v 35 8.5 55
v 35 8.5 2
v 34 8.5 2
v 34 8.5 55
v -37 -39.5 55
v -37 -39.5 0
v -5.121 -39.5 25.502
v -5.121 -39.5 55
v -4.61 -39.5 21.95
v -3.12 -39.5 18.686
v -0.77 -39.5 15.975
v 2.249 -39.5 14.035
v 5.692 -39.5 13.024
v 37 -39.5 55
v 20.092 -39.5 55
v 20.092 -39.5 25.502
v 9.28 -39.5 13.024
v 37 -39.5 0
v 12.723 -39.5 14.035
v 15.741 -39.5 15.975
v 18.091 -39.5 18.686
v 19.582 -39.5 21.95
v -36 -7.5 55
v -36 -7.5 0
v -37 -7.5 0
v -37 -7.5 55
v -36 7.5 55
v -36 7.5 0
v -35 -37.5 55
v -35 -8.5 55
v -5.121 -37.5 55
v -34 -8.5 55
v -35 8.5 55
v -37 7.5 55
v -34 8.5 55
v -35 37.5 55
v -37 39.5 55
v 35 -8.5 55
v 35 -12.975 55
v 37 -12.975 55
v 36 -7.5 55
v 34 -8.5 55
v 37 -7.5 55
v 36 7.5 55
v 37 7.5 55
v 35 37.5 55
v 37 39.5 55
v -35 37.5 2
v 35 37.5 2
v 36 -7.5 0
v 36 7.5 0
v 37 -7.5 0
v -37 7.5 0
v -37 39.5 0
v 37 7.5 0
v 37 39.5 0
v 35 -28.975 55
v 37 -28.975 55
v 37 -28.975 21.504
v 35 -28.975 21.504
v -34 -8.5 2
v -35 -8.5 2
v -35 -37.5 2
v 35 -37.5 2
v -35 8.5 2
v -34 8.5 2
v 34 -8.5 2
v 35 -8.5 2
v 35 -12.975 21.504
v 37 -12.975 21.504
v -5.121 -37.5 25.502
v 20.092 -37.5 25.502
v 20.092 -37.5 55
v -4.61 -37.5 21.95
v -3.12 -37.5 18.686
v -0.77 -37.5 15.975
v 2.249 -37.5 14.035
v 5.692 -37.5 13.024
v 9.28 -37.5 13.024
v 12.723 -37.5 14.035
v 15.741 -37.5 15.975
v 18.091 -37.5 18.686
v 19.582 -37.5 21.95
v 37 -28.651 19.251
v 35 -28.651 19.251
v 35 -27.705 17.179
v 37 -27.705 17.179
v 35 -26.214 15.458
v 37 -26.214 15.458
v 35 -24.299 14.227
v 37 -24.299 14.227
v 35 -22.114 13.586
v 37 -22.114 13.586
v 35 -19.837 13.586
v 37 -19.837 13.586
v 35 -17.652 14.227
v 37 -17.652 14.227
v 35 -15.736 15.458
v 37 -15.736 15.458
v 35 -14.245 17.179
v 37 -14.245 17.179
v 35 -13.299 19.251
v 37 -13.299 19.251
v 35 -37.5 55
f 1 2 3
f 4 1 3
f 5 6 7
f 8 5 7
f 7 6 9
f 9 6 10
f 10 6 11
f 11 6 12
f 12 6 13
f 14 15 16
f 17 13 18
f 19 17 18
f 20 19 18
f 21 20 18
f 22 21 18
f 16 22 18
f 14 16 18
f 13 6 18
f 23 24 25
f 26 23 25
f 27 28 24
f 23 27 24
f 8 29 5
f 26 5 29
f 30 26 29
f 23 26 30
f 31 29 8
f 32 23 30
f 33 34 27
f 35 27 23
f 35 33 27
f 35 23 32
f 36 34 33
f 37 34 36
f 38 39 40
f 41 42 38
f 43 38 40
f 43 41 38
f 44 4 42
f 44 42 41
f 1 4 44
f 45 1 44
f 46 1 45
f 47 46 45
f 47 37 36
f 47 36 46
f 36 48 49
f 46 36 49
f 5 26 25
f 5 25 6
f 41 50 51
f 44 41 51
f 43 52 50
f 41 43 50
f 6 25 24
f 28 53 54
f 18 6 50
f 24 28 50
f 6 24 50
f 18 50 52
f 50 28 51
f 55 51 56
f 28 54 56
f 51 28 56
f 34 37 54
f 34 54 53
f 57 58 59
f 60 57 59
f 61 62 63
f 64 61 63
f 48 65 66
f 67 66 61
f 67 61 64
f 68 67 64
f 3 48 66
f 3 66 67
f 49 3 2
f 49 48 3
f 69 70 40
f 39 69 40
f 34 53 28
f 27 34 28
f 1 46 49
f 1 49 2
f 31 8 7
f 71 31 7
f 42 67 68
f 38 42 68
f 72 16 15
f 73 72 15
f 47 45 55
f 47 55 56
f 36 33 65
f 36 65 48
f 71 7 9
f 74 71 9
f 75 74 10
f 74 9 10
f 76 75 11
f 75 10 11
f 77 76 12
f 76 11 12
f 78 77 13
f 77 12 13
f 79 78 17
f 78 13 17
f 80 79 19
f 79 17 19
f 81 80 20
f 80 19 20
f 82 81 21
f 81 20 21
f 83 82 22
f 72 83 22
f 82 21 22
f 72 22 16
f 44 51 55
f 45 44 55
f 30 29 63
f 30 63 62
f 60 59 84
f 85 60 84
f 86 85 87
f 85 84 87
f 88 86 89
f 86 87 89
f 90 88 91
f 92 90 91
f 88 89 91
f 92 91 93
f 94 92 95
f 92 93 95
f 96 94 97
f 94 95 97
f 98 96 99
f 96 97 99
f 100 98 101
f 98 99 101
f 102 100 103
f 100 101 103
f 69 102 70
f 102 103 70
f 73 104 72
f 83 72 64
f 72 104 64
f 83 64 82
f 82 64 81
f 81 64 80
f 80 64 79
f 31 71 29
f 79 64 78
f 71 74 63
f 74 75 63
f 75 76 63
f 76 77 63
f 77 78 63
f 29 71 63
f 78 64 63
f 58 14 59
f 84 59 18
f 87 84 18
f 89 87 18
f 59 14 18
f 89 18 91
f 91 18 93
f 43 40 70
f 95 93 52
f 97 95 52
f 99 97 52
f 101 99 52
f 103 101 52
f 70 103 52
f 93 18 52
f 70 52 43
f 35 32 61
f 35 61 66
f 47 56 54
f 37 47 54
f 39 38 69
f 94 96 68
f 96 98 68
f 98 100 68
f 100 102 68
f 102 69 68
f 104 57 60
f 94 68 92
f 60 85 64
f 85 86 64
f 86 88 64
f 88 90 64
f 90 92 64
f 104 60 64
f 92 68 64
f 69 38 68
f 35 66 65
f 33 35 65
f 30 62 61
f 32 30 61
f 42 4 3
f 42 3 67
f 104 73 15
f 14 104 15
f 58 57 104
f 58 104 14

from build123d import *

# Parameters (mm, degrees)
F1_DEPTH = 2
F2_DEPTH = 55
F4_DEPTH = 3
F6_DEPTH = 3


with BuildPart() as f1:
    # F0 (on Top) → F1 (new body)
    with BuildSketch(Plane.XY):
        Polygon((-35, -37.5), (35, -37.5), (35, -8.5), (34, -8.5), (34, 0), (34, 8.5), (35, 8.5), (35, 37.5), (-35, 37.5), (-35, 8.5), (-34, 8.5), (-34, 0), (-34, -8.5), (-35, -8.5), align=None)
    extrude(amount=F1_DEPTH)

    # F0 (on Top) → F2 (join)
    with BuildSketch(Plane.XY):
        Polygon((-37, -39.5), (37, -39.5), (37, -7.5), (36, -7.5), (36, 0), (36, 7.5), (37, 7.5), (37, 39.5), (-37, 39.5), (-37, 7.5), (-36, 7.5), (-36, 0), (-36, -7.5), (-37, -7.5), align=None)
        Polygon((35, -8.5), (35, -37.5), (-35, -37.5), (-35, -8.5), (-34, -8.5), (-34, 0), (-34, 8.5), (-35, 8.5), (-35, 37.5), (35, 37.5), (35, 8.5), (34, 8.5), (34, 0), (34, -8.5), align=None, mode=Mode.SUBTRACT)
    extrude(amount=F2_DEPTH)

    # F3 (on face) → F4 (cut)
    with BuildSketch(Plane.XZ.offset(39.5)):
        with BuildLine():
            Line((-5.120877, 55), (-5.120877, 25.502008))
            ThreePointArc((-5.120877, 25.502008), (7.485725, 12.895406), (20.092327, 25.502008))
            Line((20.092327, 25.502008), (20.092327, 55))
            Line((20.092327, 55), (-5.120877, 55))
        make_face()
    extrude(amount=-F4_DEPTH, mode=Mode.SUBTRACT)

    # F5 (on face) → F6 (cut)
    with BuildSketch(Plane.YZ.offset(37)):
        with BuildLine():
            ThreePointArc((-28.975196, 21.504425), (-20.975196, 13.504425), (-12.975196, 21.504425))
            Line((-12.975196, 21.504425), (-12.975196, 55))
            Line((-12.975196, 55), (-28.975196, 55))
            Line((-28.975196, 55), (-28.975196, 21.504425))
        make_face()
    extrude(amount=-F6_DEPTH, mode=Mode.SUBTRACT)


solid = f1.part
